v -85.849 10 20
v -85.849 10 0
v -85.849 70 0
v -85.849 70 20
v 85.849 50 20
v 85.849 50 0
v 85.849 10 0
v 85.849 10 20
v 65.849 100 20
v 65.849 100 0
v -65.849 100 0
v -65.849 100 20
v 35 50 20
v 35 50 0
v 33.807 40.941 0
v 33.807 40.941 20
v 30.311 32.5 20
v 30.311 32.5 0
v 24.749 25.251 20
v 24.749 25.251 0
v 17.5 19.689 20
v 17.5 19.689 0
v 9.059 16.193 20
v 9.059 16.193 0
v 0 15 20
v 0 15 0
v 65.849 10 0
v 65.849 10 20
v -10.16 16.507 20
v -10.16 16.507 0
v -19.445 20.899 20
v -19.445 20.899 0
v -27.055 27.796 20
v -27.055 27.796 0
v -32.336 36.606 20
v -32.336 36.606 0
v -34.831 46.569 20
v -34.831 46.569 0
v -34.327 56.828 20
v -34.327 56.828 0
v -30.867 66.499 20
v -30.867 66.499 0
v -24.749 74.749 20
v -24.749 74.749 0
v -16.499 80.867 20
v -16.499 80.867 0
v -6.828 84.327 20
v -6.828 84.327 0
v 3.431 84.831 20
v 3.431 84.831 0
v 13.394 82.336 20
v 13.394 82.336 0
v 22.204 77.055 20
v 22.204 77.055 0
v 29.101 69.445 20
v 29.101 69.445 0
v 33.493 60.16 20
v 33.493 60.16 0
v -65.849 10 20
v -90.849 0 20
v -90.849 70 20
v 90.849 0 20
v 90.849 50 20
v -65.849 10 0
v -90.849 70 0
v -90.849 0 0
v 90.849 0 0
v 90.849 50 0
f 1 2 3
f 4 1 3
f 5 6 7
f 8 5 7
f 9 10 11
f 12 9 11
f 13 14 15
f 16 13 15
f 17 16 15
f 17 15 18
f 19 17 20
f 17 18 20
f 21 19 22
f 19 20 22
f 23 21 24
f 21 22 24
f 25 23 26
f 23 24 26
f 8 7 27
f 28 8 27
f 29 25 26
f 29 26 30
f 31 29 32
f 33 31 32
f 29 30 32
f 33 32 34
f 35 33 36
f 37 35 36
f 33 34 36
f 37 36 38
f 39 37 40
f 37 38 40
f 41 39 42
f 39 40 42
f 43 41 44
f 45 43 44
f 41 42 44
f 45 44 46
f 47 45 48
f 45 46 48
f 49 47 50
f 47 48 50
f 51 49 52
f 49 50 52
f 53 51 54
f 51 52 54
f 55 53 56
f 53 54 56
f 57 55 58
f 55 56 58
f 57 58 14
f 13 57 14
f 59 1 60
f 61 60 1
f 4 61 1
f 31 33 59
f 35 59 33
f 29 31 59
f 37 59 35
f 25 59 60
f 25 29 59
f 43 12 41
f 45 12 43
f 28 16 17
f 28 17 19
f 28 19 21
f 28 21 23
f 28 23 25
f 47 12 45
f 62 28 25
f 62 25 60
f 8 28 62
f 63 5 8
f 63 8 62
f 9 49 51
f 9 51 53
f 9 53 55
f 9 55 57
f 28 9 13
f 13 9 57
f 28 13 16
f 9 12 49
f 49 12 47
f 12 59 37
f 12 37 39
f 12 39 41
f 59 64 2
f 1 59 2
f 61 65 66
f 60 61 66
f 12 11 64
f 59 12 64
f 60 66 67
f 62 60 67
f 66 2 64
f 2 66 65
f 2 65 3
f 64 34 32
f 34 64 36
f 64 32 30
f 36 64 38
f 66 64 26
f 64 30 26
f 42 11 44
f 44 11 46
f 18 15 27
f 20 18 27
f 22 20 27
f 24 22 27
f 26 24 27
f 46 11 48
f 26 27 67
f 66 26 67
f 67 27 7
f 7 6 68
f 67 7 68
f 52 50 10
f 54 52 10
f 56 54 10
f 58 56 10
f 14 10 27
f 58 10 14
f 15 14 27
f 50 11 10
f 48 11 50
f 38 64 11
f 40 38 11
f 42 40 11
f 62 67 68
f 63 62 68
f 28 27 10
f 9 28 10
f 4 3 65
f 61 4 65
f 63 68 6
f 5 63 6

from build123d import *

# Parameters (mm, degrees)
F1_DEPTH = 20


with BuildPart() as f1:
    # F0 (on Top) → F1 (new body)
    with BuildSketch(Plane.XY):
        Polygon((-90.849426, 50), (-90.849426, 0), (0, 0), (90.849426, 0), (90.849426, 50), (85.849426, 50), (85.849426, 10), (75.849426, 10), (65.849426, 10), (65.849426, 70), (65.849426, 90), (65.849426, 100), (-65.849426, 100), (-65.849426, 90), (-65.849426, 70), (-65.849426, 10), (-75.849426, 10), (-85.849426, 10), (-85.849426, 50), (-85.849426, 70), (-90.849426, 70), align=None)
        with BuildLine():
            ThreePointArc((35, 50), (24.748737, 25.251263), (0, 15))
            ThreePointArc((0, 15), (-24.748737, 74.748737), (35, 50))
        make_face(mode=Mode.SUBTRACT)
    extrude(amount=F1_DEPTH)


solid = f1.part
